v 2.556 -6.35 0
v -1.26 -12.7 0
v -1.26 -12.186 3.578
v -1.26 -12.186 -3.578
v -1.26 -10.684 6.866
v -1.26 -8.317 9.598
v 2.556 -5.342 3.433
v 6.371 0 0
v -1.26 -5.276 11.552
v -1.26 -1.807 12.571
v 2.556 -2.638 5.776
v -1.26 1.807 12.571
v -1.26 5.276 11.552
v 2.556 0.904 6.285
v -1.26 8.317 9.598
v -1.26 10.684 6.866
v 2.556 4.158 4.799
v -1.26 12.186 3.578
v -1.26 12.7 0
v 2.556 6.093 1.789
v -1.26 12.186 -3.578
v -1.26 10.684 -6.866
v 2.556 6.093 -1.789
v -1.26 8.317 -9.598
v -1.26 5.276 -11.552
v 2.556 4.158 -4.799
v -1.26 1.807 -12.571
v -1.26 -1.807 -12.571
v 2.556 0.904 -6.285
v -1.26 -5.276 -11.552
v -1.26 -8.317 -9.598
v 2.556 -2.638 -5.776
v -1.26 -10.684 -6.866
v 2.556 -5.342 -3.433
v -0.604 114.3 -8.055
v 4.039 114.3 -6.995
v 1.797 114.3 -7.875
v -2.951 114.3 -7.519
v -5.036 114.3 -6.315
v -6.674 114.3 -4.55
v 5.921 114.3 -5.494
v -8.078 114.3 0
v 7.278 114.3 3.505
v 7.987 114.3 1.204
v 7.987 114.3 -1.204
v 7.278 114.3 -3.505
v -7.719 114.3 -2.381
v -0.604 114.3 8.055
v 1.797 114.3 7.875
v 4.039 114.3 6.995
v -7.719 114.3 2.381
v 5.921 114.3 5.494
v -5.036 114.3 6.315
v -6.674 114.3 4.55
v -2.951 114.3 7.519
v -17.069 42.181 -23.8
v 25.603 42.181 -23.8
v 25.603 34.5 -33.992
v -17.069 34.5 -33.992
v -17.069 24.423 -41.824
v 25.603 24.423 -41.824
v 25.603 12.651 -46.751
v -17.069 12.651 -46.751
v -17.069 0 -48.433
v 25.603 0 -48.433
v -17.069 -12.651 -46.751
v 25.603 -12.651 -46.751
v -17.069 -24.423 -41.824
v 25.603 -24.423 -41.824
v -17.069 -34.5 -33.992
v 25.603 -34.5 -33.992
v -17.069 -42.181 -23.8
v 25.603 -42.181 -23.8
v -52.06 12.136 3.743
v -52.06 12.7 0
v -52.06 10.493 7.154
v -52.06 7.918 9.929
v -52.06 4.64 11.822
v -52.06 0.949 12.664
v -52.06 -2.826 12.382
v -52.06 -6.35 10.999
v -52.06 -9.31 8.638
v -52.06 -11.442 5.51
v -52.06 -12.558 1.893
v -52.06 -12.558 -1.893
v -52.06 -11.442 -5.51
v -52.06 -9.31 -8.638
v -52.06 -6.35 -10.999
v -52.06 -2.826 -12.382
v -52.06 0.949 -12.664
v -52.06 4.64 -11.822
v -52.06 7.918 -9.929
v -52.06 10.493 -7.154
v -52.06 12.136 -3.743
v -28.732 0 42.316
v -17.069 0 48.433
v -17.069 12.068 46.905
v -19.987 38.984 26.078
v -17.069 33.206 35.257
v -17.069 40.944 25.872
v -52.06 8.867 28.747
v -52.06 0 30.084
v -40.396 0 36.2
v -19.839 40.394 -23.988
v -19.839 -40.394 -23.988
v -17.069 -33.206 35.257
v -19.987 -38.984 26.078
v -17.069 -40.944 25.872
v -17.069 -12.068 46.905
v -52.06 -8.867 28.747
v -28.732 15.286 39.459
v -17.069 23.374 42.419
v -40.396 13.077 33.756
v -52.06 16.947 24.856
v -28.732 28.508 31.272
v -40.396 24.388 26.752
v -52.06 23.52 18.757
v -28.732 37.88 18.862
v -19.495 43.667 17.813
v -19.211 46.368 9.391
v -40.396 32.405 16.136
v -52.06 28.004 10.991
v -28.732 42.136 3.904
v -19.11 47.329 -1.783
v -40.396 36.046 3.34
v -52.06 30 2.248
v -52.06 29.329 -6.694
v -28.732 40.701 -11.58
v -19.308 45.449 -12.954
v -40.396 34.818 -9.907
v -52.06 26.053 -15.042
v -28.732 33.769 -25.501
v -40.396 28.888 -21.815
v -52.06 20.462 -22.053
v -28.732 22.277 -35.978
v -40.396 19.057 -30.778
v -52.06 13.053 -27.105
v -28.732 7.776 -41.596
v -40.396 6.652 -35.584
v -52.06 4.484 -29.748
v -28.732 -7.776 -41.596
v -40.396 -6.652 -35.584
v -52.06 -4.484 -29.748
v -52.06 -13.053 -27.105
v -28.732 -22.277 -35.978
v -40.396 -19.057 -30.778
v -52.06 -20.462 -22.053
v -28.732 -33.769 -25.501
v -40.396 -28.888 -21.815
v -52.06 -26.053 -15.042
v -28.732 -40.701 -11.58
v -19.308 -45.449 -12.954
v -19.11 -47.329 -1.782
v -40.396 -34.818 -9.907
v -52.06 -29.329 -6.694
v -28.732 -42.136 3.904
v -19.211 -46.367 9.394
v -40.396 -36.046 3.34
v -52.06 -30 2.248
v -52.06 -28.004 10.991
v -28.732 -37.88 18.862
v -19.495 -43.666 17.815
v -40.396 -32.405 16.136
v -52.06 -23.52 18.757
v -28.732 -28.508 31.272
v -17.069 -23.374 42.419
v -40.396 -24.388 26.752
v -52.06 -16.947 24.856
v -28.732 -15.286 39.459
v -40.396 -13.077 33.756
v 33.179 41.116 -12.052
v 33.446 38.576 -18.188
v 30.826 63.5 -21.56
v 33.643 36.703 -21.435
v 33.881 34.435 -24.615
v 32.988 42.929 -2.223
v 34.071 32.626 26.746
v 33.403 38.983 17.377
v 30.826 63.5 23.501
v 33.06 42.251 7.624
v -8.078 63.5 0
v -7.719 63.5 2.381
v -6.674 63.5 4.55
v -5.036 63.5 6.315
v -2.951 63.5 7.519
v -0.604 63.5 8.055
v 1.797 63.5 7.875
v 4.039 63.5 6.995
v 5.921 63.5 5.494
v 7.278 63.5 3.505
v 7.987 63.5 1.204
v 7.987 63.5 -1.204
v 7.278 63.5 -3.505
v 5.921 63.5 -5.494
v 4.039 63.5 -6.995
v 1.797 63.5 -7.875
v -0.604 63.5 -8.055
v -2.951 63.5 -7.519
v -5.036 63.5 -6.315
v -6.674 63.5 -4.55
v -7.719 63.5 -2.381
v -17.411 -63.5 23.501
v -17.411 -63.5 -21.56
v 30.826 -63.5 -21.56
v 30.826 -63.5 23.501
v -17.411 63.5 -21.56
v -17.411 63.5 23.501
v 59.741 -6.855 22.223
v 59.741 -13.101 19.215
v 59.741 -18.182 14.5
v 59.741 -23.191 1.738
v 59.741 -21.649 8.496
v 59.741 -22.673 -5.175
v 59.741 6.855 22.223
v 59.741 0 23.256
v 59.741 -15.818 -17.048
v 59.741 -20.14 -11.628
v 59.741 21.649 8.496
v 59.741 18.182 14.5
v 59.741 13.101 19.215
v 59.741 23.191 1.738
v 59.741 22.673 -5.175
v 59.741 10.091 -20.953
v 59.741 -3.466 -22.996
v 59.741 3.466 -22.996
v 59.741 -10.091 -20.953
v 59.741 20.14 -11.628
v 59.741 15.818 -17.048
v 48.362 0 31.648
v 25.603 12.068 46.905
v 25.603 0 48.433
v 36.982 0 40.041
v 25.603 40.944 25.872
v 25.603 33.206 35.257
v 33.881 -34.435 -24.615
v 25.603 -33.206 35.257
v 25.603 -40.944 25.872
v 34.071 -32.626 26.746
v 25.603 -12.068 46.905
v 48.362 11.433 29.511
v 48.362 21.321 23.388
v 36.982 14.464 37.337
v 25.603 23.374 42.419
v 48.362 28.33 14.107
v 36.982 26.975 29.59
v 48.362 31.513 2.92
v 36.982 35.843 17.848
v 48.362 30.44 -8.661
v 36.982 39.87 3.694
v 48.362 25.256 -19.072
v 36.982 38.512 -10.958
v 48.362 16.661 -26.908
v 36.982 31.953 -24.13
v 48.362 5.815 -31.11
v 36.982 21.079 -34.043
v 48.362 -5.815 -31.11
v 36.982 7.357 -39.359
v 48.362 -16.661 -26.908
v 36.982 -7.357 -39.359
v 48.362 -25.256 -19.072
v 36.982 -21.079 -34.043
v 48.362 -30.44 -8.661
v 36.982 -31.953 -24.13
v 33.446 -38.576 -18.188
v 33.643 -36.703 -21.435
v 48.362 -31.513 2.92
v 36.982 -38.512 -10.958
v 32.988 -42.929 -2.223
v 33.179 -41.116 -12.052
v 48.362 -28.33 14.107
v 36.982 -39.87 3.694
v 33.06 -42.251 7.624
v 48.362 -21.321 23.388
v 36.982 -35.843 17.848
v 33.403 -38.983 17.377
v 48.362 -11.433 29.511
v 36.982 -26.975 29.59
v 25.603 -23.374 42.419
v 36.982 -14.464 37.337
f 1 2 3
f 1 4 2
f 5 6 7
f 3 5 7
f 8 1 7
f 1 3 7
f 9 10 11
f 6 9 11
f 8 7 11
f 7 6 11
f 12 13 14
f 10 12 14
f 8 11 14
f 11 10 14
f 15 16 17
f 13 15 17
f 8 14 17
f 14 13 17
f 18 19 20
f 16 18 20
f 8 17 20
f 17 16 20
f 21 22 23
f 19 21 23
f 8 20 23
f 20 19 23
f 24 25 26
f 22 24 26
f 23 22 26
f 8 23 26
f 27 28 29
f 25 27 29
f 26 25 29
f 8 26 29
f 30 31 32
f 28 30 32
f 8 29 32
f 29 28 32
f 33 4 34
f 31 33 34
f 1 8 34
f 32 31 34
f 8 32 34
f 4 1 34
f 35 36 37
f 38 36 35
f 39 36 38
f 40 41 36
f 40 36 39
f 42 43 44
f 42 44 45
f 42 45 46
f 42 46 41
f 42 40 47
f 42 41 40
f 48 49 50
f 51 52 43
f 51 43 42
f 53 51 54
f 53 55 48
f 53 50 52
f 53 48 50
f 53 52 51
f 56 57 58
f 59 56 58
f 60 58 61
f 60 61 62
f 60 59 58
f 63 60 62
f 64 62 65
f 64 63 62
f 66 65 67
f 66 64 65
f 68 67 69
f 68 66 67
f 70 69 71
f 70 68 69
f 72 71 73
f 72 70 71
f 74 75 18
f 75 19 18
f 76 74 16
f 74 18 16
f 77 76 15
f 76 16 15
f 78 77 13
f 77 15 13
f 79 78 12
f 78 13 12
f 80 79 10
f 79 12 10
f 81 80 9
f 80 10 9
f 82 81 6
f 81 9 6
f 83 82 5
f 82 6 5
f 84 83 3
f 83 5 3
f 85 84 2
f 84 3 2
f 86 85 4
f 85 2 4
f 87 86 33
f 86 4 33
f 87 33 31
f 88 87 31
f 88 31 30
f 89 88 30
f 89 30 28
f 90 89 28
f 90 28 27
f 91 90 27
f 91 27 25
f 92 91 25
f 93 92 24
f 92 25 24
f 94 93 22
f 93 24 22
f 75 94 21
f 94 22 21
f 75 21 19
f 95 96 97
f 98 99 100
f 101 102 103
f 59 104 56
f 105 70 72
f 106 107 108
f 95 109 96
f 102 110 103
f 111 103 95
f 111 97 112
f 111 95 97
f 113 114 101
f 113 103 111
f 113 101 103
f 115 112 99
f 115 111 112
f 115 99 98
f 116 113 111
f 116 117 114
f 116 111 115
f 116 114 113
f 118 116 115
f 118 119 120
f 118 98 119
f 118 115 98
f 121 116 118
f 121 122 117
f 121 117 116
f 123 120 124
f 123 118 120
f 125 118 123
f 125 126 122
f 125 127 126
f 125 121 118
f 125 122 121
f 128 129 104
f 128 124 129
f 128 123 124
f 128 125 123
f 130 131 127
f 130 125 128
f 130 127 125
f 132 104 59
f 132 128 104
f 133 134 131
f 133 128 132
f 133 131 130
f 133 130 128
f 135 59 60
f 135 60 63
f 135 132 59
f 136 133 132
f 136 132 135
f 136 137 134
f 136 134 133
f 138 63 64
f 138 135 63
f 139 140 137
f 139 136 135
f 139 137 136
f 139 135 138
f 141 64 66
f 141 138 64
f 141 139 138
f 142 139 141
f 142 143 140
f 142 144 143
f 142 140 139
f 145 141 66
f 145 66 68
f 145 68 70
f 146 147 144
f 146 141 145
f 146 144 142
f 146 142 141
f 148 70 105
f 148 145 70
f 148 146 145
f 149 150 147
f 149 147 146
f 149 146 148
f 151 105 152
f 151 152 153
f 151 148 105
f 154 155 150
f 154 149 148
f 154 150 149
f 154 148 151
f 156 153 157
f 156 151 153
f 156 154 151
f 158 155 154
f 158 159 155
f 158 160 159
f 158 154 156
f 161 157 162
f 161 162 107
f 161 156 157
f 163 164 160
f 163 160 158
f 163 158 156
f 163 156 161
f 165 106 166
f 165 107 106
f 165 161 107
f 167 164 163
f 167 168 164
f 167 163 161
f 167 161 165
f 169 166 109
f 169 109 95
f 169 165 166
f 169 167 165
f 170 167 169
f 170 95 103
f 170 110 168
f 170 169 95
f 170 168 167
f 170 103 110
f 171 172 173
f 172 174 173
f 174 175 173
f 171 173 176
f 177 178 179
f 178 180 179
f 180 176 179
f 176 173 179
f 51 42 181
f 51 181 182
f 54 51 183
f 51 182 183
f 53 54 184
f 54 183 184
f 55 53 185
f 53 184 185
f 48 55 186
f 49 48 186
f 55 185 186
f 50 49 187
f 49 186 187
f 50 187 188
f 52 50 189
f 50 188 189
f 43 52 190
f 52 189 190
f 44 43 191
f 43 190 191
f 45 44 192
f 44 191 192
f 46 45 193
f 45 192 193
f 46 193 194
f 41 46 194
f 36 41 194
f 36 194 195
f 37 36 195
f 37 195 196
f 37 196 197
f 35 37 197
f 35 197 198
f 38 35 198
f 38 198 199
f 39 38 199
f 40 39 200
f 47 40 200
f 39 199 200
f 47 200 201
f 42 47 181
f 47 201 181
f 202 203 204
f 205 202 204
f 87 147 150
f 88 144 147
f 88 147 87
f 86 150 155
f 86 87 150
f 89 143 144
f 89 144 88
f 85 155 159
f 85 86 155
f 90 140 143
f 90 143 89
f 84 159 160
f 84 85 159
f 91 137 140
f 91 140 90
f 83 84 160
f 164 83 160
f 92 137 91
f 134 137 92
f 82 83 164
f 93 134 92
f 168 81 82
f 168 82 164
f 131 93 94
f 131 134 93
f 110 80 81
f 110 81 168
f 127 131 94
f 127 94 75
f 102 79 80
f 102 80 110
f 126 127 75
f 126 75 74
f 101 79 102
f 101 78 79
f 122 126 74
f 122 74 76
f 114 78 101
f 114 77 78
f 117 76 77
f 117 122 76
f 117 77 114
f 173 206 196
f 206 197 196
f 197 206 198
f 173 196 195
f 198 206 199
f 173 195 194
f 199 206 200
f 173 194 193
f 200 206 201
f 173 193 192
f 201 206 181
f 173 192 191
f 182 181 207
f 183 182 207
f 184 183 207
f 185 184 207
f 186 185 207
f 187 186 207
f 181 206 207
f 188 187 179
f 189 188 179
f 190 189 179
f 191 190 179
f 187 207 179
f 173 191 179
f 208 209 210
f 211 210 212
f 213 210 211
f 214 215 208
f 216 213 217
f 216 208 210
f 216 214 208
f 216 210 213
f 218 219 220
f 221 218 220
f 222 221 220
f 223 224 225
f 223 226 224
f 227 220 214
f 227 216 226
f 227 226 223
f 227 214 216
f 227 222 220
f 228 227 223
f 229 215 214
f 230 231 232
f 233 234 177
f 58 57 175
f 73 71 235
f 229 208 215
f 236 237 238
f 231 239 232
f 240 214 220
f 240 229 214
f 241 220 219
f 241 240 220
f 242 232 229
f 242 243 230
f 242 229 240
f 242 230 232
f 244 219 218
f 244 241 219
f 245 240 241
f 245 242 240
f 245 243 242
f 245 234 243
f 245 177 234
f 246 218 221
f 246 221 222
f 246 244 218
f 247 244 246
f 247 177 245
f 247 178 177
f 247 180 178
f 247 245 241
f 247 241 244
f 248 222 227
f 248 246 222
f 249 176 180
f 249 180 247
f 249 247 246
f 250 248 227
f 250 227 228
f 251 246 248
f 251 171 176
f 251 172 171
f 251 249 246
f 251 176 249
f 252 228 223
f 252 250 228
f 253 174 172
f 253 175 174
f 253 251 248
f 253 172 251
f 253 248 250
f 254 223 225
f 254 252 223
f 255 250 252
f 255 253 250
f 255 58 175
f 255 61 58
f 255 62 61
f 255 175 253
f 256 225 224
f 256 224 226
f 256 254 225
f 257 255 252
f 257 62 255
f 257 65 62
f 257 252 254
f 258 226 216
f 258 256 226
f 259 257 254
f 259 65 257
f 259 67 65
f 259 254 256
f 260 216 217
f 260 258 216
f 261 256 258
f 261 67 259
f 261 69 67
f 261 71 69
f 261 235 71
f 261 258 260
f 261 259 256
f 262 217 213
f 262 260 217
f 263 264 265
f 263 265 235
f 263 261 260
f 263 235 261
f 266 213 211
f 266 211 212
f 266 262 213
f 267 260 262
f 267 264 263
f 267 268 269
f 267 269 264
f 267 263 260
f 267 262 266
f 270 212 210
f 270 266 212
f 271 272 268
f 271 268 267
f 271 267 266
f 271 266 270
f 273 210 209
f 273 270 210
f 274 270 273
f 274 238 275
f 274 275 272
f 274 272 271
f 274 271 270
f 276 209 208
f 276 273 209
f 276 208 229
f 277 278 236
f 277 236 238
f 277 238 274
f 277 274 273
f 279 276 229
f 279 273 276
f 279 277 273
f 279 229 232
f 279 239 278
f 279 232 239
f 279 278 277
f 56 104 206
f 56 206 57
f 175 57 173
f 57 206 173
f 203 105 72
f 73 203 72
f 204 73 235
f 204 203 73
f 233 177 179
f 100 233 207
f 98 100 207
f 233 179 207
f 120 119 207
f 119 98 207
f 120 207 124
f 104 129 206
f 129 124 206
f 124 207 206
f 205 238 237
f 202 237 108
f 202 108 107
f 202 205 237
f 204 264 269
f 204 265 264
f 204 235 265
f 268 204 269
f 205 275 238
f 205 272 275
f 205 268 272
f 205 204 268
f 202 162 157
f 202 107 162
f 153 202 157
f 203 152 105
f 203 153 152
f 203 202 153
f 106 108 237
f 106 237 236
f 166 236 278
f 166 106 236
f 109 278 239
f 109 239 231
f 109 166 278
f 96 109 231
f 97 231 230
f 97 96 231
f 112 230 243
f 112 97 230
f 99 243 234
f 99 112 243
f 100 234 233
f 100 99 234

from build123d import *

# Parameters (mm, degrees)
F0_W     = 61.5850389004
F0_H     = 58.4090147167
F1_DEPTH = 63.5
F1_TAPER = 6
F2_R     = 8.0775927696
F3_DEPTH = 50.8
F7_D     = 25.4
F7_DEPTH = 50.8
F7_TIP   = 7.6309298617


with BuildPart() as f1:
    # F0 (on Front) → F1 (new body, symmetric)
    with BuildSketch(Plane.XZ):
        with Locations((6.7078769207, 0.9706830606)):
            Rectangle(F0_W, F0_H)
    extrude(amount=F1_DEPTH, both=True, taper=F1_TAPER)

    # F2 (on face) → F3 (join)
    with BuildSketch(Plane(origin=(0, 63.5, 0), x_dir=(-1, 0, 0), z_dir=(0, 1, 0))):
        Circle(F2_R)
    extrude(amount=F3_DEPTH)

    # F4 (on Front) → F5 (revolve)
    with BuildSketch(Plane.XZ):
        Polygon((-52.0598404109, 0), (59.7408004105, 0), (59.7408004105, 23.2562404126), (25.6031993777, 48.4327189624), (-17.0687995851, 48.4327189624), (-52.0598404109, 30.0837587565), align=None)
    revolve(axis=Axis((3.8404799998, 0, 0), (-1, 0, 0)))

    # F7
    with Locations(Plane(origin=(-52.0598404109, 0, 0), x_dir=(0, -1, 0), z_dir=(-1, 0, 0))):
        with Locations((0, 0)):
            Hole(F7_D / 2, depth=F7_DEPTH)
            with Locations((0, 0, -(F7_DEPTH + F7_TIP / 2))):  # 118° drill point
                Cone(0, F7_D / 2, F7_TIP, mode=Mode.SUBTRACT)


solid = f1.part
